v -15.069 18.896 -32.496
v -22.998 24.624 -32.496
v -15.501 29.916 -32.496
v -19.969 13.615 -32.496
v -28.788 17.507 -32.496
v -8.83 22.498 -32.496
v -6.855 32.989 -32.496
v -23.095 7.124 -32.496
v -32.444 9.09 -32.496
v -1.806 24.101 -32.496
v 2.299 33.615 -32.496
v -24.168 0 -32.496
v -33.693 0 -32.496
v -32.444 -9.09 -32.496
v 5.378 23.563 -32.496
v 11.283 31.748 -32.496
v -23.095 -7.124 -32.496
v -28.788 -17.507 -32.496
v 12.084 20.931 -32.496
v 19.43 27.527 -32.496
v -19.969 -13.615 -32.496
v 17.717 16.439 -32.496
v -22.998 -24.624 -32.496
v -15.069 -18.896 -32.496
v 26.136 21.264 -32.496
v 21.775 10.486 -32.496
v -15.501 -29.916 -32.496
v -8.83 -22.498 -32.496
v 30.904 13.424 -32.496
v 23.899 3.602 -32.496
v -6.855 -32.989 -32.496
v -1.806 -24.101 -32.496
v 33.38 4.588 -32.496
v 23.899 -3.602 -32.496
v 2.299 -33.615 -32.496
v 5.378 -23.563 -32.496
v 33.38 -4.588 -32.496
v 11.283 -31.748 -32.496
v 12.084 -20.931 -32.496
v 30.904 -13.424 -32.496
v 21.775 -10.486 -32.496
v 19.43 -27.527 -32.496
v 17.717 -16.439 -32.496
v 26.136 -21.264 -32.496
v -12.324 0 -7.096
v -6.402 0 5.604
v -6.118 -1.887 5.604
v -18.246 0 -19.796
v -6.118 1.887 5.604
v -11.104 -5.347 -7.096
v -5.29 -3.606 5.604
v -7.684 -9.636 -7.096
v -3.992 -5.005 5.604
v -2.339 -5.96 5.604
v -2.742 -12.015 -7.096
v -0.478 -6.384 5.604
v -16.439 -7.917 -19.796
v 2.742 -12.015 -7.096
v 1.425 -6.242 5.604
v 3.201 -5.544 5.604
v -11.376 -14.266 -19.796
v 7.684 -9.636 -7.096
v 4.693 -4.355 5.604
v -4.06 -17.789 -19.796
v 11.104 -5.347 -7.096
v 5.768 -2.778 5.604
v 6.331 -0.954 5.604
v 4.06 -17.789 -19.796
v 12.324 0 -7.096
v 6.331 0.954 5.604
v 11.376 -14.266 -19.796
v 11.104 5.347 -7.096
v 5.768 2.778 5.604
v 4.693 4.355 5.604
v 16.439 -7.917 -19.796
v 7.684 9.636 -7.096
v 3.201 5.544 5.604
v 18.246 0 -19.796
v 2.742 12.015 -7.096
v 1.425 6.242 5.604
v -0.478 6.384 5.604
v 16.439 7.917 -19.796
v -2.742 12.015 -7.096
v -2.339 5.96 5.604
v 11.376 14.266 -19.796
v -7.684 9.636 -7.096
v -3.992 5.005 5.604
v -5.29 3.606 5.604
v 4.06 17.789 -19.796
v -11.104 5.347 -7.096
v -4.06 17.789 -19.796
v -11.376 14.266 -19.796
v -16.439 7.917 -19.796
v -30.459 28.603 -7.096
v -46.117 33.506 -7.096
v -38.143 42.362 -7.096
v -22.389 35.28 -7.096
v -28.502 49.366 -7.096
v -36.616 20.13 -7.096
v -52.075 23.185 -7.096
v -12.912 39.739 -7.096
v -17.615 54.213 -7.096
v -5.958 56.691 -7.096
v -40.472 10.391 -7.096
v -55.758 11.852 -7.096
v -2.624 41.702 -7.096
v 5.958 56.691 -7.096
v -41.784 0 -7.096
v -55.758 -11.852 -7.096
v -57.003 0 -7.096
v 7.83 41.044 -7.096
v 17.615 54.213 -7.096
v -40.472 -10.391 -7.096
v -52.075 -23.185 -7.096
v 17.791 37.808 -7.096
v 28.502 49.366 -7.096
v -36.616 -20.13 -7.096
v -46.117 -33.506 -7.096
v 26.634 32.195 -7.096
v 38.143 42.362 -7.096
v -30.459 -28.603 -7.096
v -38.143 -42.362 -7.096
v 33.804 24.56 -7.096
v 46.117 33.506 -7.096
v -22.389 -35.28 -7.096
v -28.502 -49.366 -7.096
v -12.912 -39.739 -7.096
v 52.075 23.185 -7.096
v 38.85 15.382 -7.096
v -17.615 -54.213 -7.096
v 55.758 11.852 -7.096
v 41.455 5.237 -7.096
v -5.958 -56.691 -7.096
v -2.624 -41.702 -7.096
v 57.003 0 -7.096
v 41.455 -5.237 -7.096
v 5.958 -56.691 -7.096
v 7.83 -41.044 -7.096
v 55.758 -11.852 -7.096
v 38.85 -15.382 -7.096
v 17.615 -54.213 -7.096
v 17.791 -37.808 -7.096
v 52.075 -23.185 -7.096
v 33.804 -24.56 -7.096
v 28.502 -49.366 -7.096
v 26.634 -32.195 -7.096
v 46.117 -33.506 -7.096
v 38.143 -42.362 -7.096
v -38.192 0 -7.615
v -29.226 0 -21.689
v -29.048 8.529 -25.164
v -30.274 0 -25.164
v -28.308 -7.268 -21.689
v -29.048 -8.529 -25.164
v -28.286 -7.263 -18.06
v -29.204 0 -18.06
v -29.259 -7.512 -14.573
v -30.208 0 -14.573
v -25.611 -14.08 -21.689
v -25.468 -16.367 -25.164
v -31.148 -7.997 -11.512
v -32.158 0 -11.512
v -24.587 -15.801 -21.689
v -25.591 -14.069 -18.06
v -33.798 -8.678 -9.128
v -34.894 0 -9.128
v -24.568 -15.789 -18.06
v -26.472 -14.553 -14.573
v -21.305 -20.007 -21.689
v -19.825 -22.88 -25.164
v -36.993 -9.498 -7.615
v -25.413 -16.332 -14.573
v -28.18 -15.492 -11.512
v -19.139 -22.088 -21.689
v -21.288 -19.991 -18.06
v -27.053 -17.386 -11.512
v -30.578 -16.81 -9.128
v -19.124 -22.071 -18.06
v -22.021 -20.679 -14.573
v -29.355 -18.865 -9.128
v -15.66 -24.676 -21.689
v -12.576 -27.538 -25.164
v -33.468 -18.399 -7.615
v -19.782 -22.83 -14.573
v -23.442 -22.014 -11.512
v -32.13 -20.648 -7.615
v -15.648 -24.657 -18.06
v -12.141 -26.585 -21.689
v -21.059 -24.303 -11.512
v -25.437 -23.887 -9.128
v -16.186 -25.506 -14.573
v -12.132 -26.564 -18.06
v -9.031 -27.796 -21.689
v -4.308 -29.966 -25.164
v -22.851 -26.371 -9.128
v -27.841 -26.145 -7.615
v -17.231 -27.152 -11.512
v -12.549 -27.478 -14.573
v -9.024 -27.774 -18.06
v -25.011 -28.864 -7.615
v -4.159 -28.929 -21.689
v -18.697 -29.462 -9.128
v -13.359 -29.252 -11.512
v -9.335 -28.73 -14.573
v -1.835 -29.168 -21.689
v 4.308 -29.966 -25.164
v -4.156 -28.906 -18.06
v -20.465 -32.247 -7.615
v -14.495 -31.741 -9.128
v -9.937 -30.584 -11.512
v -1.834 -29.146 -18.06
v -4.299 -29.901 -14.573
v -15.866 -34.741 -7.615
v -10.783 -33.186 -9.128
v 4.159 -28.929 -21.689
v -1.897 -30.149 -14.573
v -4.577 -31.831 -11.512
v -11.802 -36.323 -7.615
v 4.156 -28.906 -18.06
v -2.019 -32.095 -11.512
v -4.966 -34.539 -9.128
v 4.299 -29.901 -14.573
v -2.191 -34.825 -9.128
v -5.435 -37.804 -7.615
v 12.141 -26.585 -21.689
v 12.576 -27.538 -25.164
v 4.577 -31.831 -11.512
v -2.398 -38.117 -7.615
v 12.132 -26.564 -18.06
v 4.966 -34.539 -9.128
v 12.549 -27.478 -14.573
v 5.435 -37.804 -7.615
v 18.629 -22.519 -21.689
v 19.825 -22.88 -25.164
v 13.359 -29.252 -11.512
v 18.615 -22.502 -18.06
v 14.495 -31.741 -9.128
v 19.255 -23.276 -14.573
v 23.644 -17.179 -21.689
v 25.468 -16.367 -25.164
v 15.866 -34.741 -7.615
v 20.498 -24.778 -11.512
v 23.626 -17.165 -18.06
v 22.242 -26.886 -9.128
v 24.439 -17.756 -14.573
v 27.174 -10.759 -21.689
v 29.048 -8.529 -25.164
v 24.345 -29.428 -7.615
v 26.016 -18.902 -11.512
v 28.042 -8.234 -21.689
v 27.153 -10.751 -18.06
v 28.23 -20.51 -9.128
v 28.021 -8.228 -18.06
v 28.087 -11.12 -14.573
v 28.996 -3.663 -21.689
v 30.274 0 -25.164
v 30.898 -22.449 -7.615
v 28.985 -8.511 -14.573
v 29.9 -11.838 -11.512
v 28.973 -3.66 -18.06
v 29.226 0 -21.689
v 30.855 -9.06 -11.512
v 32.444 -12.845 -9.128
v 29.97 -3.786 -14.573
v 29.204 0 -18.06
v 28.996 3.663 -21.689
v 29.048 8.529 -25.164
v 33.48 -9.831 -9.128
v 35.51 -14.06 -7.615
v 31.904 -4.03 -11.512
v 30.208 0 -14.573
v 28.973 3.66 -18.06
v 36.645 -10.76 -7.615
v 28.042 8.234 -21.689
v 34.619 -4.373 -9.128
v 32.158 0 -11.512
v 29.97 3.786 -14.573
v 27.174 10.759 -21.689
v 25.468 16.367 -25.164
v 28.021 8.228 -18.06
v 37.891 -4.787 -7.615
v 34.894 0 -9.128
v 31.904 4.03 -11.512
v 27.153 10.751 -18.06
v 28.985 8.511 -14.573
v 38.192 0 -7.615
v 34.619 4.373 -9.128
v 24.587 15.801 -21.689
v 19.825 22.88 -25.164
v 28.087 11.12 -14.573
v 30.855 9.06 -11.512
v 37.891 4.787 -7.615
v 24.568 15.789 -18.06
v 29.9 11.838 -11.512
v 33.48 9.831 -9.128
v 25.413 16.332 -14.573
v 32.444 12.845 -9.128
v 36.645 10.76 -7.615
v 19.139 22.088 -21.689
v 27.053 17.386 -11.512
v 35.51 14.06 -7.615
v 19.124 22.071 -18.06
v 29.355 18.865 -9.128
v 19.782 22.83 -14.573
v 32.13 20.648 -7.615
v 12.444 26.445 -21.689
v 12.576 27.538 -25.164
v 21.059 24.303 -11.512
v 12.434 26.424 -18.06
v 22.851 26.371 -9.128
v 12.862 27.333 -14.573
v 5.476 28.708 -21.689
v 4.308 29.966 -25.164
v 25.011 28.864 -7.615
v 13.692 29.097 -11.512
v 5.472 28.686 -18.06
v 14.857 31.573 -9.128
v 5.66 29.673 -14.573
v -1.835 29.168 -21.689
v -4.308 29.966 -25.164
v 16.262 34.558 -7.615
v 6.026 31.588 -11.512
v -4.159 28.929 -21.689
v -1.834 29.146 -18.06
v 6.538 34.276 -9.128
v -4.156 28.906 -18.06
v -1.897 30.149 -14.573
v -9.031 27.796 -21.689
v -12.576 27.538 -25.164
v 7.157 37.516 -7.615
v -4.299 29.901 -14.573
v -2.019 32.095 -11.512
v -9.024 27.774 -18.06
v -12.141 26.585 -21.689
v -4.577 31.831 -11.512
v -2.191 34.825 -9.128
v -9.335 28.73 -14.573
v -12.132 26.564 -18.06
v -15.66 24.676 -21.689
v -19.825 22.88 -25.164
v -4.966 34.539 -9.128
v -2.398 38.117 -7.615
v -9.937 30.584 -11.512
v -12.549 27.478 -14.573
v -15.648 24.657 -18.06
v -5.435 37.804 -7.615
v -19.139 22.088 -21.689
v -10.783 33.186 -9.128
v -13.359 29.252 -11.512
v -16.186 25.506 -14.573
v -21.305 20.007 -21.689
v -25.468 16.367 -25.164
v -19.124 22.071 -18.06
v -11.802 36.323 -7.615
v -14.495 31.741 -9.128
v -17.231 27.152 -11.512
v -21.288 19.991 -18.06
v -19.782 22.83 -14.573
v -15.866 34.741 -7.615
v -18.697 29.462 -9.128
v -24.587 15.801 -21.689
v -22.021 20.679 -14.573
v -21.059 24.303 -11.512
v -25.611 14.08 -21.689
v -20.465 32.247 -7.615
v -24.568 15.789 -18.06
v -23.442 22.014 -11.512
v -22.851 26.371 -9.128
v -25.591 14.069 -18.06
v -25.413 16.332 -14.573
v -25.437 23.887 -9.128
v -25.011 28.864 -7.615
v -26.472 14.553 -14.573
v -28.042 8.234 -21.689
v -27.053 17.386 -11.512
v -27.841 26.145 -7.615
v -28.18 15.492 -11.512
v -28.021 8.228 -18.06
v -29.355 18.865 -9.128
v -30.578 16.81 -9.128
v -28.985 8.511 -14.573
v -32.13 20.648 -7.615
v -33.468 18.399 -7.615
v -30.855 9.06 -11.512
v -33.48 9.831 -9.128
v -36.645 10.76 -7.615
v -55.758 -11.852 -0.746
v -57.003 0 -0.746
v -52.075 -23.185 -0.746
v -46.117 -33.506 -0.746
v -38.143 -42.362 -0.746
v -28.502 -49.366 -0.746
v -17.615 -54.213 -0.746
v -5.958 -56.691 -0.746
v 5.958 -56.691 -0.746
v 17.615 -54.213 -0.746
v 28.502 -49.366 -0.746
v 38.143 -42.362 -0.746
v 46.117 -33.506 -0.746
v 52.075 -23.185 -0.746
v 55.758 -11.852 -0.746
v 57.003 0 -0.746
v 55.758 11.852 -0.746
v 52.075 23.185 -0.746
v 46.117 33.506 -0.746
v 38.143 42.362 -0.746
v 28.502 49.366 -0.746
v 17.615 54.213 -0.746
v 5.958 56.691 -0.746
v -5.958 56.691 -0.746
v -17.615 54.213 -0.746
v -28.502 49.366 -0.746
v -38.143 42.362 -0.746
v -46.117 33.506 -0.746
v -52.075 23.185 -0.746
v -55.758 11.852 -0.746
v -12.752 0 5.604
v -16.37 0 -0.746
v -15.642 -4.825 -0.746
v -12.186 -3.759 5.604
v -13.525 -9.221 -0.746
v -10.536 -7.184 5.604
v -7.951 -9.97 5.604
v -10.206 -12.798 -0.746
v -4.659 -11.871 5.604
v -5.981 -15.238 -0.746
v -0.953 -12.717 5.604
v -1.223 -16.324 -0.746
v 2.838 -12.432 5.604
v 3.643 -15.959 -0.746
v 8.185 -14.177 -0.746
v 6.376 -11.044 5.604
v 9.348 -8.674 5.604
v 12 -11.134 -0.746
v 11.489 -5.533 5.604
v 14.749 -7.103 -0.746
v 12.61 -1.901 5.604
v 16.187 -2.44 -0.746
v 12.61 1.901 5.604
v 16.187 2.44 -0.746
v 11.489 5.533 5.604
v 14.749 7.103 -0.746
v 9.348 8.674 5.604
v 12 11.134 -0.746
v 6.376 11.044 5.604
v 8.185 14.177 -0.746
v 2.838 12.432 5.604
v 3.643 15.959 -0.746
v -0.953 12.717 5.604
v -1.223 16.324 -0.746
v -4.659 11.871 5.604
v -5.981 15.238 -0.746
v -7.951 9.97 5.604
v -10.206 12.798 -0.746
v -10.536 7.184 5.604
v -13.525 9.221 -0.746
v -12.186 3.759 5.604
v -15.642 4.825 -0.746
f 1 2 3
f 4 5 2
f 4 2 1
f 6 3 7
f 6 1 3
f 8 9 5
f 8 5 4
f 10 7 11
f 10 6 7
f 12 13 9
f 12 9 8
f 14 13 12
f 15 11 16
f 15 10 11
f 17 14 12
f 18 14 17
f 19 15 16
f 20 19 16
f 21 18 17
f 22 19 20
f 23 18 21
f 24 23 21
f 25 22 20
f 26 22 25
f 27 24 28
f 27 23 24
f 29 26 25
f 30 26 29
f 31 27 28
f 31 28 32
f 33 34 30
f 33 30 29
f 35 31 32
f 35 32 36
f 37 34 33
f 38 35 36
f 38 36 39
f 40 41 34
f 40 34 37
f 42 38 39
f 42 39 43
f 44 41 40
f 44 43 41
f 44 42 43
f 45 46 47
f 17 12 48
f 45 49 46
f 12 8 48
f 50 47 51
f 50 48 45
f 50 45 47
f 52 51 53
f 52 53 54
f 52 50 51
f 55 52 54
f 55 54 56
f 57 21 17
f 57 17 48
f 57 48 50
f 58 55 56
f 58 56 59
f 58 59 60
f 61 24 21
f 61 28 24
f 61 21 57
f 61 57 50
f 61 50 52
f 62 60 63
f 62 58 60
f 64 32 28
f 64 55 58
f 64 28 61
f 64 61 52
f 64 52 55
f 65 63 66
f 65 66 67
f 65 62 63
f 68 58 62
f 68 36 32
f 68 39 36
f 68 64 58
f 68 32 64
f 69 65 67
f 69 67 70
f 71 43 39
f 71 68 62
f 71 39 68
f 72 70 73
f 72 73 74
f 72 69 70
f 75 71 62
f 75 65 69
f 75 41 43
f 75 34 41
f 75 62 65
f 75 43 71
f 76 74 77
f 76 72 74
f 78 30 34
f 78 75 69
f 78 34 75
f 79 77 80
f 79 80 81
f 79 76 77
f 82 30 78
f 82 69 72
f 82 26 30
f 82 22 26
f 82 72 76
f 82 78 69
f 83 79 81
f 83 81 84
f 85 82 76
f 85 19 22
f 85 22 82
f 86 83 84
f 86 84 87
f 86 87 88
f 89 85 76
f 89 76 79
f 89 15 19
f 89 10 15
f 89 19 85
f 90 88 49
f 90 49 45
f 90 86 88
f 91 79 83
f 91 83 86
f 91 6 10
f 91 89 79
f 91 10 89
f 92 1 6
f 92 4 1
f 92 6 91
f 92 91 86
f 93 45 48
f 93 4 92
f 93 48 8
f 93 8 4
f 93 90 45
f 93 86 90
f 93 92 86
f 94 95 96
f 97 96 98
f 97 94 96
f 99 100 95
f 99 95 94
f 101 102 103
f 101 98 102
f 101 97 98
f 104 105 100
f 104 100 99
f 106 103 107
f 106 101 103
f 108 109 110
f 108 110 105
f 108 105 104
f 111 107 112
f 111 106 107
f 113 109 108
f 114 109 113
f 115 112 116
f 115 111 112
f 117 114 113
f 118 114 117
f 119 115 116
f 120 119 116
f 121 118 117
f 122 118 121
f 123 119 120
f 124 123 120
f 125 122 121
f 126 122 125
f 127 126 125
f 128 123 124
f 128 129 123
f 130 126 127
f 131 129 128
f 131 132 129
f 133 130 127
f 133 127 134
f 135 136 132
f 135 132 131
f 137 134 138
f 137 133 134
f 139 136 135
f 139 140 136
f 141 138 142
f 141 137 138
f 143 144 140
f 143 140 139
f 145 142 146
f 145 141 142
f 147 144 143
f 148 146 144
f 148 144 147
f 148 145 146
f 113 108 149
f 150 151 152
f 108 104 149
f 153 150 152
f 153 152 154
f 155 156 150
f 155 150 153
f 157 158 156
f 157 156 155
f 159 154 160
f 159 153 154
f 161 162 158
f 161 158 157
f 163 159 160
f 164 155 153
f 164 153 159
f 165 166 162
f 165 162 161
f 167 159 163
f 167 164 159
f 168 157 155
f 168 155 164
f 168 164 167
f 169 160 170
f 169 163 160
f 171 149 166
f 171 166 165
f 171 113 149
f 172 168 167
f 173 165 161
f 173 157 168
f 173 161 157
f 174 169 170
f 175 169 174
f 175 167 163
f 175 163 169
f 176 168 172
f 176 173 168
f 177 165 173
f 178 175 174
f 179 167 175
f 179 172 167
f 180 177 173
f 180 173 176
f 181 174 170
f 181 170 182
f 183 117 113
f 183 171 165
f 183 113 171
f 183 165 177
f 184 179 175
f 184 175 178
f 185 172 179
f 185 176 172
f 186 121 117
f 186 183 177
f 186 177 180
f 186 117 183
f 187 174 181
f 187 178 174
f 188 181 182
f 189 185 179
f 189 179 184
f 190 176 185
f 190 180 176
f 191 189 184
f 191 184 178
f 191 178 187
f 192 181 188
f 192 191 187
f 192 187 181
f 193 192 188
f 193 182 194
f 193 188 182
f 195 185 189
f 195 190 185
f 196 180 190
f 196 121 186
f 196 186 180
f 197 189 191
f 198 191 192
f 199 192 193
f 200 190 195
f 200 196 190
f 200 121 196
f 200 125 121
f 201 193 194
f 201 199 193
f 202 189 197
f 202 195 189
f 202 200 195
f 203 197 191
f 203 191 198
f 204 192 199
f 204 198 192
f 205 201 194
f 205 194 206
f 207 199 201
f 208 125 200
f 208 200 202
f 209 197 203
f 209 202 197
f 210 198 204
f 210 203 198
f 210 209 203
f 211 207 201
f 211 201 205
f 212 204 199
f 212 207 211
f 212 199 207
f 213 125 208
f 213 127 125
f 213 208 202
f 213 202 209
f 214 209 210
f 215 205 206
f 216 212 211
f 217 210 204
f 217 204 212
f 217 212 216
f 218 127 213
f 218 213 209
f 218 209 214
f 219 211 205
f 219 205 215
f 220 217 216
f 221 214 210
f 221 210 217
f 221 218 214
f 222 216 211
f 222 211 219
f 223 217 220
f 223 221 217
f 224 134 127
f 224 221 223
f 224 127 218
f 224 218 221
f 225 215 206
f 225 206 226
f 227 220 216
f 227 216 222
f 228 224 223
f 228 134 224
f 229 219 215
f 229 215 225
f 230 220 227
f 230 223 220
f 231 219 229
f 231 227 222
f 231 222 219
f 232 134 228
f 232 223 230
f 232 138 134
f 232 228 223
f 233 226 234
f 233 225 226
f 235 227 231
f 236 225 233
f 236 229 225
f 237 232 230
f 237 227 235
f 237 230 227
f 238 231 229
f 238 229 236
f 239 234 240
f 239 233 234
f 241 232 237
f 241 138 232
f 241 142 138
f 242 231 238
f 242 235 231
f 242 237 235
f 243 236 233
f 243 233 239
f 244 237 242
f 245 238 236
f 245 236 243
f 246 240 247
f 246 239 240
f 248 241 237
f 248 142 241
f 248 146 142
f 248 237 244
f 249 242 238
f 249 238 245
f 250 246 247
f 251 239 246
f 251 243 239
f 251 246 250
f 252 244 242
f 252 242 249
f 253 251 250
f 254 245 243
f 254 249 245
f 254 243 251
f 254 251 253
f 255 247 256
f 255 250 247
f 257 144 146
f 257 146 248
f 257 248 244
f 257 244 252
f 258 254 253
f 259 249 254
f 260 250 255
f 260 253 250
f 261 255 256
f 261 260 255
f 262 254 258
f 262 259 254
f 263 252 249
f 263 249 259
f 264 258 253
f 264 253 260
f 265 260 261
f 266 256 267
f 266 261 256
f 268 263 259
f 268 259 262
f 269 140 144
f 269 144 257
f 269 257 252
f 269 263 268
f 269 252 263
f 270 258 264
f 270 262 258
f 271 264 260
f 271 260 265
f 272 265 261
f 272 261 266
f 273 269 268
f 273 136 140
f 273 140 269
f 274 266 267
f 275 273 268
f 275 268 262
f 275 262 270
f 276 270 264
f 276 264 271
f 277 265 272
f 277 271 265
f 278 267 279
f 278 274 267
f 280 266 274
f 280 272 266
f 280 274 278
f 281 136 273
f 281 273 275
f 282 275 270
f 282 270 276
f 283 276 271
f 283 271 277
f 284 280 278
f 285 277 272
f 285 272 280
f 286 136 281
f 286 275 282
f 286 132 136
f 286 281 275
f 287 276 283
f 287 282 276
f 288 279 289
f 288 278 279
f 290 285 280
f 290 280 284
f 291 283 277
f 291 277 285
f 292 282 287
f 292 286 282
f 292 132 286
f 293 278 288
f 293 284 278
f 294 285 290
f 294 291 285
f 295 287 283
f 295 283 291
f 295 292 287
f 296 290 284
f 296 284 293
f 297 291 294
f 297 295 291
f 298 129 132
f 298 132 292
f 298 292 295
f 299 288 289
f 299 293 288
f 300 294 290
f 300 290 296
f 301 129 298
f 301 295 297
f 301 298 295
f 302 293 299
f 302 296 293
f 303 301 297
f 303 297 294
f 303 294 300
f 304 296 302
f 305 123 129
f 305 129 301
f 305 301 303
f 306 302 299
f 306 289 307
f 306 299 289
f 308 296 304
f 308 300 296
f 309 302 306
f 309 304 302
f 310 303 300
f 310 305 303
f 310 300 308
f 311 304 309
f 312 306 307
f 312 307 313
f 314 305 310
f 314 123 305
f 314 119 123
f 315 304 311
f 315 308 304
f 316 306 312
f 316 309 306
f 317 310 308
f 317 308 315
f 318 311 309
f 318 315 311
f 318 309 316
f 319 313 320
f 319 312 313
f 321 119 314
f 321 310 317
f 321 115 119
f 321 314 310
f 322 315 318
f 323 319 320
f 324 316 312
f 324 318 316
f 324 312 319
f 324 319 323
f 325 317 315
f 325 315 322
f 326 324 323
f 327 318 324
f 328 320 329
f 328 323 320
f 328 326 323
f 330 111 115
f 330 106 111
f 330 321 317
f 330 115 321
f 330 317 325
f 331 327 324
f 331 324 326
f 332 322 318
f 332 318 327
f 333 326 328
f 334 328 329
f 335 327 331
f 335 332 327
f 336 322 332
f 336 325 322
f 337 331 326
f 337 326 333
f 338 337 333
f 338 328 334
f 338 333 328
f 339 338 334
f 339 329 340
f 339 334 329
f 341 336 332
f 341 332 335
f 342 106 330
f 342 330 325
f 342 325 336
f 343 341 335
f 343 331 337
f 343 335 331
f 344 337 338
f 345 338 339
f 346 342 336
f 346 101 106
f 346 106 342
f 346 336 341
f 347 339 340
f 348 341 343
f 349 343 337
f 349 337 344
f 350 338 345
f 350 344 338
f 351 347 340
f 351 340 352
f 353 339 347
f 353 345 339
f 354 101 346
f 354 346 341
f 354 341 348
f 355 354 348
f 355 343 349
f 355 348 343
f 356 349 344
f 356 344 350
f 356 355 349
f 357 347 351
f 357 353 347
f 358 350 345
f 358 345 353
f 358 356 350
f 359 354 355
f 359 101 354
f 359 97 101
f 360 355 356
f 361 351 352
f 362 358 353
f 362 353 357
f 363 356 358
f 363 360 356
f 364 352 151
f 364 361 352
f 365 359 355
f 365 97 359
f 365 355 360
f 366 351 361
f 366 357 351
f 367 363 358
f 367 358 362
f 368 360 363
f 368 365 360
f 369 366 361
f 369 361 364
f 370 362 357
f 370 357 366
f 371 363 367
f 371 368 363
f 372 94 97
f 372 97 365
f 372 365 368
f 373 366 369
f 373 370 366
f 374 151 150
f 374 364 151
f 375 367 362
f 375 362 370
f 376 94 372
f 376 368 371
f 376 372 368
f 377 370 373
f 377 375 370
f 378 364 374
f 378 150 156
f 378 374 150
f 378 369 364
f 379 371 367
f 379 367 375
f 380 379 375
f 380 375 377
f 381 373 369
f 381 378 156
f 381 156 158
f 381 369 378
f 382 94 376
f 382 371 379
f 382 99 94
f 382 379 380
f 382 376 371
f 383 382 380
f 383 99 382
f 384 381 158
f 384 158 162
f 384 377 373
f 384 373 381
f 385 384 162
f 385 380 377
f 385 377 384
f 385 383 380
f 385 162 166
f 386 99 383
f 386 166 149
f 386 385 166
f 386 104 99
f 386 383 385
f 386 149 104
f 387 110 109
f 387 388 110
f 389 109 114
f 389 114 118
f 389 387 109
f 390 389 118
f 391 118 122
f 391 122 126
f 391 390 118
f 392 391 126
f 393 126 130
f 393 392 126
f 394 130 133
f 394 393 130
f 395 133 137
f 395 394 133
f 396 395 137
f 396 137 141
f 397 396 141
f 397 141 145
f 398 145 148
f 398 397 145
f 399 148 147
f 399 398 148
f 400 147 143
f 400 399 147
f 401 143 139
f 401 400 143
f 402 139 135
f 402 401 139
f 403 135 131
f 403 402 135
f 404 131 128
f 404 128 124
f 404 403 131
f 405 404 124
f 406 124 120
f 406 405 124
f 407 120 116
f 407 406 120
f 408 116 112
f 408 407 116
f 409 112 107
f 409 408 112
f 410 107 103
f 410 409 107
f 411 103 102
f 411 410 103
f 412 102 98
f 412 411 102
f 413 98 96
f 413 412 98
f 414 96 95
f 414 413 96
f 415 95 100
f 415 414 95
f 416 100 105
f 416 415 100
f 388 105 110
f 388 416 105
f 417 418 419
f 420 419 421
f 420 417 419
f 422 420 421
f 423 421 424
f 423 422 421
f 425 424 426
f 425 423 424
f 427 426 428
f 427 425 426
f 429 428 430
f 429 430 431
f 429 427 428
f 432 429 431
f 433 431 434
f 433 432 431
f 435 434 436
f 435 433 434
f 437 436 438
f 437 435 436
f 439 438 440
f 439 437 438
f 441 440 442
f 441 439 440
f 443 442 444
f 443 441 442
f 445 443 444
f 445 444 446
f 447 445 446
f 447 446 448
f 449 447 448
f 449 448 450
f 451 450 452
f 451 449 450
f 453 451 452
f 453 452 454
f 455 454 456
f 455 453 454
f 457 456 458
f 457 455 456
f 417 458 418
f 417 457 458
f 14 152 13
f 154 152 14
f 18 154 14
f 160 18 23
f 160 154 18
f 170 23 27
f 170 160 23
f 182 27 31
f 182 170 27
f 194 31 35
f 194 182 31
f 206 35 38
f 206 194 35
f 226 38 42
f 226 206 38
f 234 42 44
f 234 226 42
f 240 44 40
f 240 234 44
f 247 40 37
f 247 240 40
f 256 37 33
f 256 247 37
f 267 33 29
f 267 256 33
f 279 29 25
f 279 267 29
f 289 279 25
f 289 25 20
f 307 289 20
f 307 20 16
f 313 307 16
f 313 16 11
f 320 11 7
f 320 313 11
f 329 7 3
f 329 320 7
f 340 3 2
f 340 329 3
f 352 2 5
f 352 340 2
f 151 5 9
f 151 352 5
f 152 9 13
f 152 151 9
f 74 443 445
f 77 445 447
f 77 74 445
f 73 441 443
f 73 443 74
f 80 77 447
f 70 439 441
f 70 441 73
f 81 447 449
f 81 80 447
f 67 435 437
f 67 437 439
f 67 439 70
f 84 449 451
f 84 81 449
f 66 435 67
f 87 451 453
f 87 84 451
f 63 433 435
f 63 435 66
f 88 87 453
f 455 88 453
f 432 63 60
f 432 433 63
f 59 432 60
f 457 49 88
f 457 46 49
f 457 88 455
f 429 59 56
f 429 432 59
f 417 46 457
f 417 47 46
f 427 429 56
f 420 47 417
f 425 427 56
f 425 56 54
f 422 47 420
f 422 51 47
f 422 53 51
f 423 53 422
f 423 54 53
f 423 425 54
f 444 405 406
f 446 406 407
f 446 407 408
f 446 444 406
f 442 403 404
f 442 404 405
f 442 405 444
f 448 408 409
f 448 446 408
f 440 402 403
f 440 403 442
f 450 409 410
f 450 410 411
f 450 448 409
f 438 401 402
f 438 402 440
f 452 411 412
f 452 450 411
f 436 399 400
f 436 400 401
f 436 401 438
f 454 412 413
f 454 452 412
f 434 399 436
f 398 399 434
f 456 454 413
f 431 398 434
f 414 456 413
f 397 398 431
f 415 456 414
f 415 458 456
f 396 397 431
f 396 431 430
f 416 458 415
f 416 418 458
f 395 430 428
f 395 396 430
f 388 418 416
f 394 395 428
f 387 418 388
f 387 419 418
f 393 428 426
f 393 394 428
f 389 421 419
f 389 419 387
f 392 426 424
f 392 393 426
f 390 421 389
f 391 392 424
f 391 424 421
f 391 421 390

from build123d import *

# Parameters (mm, degrees)
FILLET1_R = 12.7


with BuildPart() as part:
    # Sketch1 → Revolve1 (revolve)
    with BuildSketch(Plane(origin=(0, 0, 0), x_dir=(1, 0, 0), z_dir=(0, 1, 0))):
        Polygon((-6.402170304, -5.603691702), (-24.16849208, 32.496308298), (-33.69349208, 32.496308298), (-21.849277563, 7.096308298), (-57.003438355, 7.096308298), (-57.003438355, 0.746308298), (-16.369673719, 0.746308298), (-12.752170304, -5.603691702), align=None)
    revolve(axis=Axis((0, 0, -42.597586509), (0, 0, 1)))

    # Fillet1
    fillet1_edges = [part.edges().sort_by_distance(p)[0] for p in [
        (21.849277563, 0, -7.096308298),
    ]]
    fillet(fillet1_edges, radius=FILLET1_R)


solid = part.part
